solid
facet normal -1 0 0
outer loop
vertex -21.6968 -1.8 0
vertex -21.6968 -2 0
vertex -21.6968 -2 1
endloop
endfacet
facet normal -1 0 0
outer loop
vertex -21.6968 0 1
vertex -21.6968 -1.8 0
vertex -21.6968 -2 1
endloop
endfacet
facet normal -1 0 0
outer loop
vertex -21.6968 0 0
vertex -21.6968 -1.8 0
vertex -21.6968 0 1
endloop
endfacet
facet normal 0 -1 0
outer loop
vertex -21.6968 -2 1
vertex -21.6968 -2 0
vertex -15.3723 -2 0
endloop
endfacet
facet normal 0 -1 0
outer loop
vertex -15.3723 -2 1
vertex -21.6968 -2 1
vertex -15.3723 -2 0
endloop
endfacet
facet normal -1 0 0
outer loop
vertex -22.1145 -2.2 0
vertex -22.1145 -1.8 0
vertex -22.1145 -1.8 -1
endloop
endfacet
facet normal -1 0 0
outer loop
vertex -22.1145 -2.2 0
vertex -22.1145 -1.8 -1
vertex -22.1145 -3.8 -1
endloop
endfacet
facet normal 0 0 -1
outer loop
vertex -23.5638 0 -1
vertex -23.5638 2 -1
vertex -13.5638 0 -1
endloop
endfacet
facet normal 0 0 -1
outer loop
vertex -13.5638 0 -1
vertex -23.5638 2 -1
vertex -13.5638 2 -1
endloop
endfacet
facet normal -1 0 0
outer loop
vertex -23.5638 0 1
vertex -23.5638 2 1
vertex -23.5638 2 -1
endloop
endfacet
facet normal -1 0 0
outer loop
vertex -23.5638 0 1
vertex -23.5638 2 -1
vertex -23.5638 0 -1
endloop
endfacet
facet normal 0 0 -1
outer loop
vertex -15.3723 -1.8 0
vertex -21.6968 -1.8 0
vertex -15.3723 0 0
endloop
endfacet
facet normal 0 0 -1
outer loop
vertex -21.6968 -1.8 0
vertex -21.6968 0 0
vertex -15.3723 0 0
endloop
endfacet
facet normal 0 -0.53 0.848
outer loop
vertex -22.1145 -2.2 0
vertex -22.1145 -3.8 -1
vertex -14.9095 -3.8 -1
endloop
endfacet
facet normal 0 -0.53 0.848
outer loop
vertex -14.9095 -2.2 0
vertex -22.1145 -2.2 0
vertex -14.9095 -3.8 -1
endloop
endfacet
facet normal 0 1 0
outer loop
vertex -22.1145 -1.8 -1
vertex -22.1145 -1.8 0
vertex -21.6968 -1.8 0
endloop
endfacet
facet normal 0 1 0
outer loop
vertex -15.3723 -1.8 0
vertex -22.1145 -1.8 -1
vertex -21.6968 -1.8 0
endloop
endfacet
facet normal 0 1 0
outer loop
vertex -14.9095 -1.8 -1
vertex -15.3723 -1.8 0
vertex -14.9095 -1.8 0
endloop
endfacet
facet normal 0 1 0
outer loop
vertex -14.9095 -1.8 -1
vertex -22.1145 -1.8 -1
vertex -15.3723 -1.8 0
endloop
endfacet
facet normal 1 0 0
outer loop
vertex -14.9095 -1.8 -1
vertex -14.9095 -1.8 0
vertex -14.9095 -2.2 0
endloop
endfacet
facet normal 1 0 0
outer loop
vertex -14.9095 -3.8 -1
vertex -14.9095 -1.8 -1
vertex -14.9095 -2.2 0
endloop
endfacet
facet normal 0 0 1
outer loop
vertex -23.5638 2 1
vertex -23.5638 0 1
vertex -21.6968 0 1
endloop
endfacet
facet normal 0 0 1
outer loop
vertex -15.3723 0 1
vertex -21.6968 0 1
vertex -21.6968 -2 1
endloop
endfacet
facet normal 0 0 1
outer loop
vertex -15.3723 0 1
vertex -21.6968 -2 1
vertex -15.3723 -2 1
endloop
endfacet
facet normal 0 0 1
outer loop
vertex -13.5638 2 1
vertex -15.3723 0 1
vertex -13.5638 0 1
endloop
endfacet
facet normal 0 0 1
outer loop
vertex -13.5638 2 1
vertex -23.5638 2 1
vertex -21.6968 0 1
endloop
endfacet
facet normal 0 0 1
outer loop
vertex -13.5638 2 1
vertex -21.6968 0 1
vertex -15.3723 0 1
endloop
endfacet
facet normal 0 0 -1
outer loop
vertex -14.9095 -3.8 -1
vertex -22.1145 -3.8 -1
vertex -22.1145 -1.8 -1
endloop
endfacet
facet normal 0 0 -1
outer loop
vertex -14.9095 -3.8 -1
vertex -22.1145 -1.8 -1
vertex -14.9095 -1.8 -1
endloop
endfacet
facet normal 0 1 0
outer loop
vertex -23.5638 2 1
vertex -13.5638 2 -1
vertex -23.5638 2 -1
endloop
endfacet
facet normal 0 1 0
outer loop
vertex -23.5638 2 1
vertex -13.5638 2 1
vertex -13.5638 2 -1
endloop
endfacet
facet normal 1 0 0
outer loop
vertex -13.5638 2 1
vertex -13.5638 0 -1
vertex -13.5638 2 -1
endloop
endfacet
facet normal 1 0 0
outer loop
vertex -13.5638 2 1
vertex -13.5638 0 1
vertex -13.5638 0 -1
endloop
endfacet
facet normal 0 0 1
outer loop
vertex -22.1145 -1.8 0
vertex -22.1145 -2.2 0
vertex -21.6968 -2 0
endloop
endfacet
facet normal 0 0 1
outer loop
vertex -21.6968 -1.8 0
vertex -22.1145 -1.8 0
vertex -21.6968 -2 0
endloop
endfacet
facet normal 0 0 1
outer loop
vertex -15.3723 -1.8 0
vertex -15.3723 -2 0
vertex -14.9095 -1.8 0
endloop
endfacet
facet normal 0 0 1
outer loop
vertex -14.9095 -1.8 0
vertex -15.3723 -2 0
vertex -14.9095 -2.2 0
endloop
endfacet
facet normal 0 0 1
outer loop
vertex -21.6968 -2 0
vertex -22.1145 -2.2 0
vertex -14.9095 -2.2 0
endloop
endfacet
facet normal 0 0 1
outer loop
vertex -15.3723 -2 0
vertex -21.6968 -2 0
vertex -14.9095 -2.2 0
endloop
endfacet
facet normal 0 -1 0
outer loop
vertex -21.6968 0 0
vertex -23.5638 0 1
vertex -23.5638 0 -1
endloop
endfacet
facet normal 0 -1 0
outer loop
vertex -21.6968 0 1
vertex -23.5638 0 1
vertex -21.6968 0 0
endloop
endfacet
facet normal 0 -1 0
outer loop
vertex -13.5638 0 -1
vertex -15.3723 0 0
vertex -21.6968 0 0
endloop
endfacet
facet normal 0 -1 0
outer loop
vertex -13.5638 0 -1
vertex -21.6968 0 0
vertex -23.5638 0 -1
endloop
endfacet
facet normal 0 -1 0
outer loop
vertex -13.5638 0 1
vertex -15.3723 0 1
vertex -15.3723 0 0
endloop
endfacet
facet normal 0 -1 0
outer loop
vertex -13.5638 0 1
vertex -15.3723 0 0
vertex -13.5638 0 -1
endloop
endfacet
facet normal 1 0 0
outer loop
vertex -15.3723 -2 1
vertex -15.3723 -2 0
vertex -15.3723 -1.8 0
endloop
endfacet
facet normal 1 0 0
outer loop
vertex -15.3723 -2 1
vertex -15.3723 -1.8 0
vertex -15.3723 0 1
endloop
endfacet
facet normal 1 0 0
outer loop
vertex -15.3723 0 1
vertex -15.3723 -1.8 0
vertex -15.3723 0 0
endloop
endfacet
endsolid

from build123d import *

# Parameters (mm, degrees)
F0_W     = 6.3244109941
F0_H     = 2
F1_DEPTH = 1
F2_DEPTH = 1
F3_W     = 7.2049933622
F3_H     = 2
F4_DEPTH = 1
F5_SIZE2 = 0.99999
F5_SIZE  = 1.59999


# Not quite as in the source:
# - a fillet or chamfer is up to 0.001 mm smaller than in the source, because OpenCascade refuses the exact size


with BuildPart() as f1:
    # F0 (on Top) → F1 (new body)
    with BuildSketch(Plane.XY):
        Polygon((-13.5638297198, 2), (-23.5638297198, 2), (-23.5638297198, 0), (-21.6967508232, 0), (-15.3723398291, 0), (-13.5638297198, 0), align=None)
        with Locations((-18.5345453261, -1)):
            Rectangle(F0_W, F0_H)
    extrude(amount=F1_DEPTH)

    # F0 (on Top) → F2 (join)
    with BuildSketch(Plane.XY):
        Polygon((-13.5638297198, 2), (-23.5638297198, 2), (-23.5638297198, 0), (-21.6967508232, 0), (-15.3723398291, 0), (-13.5638297198, 0), align=None)
    extrude(amount=-F2_DEPTH)

    # F3 (on face) → F4 (join)
    with BuildSketch(Plane(origin=(0, 0, -1), x_dir=(1, 0, 0), z_dir=(0, 0, -1))):
        with Locations((-18.5119810809, 2.8)):
            Rectangle(F3_W, F3_H)
    extrude(amount=-F4_DEPTH)

    # F5 (size 1.6 and 1 in the source; OpenCascade refuses exactly that, so slightly less here)
    f5_edges = [f1.edges().sort_by_distance(p)[0] for p in [
        (-18.511981, -3.8, 0),
    ]]
    f5_side = f1.faces().sort_by_distance((-18.50981, -2.886602, 0))[0]
    chamfer(f5_edges, length=F5_SIZE, length2=F5_SIZE2, reference=f5_side)


solid = f1.part
